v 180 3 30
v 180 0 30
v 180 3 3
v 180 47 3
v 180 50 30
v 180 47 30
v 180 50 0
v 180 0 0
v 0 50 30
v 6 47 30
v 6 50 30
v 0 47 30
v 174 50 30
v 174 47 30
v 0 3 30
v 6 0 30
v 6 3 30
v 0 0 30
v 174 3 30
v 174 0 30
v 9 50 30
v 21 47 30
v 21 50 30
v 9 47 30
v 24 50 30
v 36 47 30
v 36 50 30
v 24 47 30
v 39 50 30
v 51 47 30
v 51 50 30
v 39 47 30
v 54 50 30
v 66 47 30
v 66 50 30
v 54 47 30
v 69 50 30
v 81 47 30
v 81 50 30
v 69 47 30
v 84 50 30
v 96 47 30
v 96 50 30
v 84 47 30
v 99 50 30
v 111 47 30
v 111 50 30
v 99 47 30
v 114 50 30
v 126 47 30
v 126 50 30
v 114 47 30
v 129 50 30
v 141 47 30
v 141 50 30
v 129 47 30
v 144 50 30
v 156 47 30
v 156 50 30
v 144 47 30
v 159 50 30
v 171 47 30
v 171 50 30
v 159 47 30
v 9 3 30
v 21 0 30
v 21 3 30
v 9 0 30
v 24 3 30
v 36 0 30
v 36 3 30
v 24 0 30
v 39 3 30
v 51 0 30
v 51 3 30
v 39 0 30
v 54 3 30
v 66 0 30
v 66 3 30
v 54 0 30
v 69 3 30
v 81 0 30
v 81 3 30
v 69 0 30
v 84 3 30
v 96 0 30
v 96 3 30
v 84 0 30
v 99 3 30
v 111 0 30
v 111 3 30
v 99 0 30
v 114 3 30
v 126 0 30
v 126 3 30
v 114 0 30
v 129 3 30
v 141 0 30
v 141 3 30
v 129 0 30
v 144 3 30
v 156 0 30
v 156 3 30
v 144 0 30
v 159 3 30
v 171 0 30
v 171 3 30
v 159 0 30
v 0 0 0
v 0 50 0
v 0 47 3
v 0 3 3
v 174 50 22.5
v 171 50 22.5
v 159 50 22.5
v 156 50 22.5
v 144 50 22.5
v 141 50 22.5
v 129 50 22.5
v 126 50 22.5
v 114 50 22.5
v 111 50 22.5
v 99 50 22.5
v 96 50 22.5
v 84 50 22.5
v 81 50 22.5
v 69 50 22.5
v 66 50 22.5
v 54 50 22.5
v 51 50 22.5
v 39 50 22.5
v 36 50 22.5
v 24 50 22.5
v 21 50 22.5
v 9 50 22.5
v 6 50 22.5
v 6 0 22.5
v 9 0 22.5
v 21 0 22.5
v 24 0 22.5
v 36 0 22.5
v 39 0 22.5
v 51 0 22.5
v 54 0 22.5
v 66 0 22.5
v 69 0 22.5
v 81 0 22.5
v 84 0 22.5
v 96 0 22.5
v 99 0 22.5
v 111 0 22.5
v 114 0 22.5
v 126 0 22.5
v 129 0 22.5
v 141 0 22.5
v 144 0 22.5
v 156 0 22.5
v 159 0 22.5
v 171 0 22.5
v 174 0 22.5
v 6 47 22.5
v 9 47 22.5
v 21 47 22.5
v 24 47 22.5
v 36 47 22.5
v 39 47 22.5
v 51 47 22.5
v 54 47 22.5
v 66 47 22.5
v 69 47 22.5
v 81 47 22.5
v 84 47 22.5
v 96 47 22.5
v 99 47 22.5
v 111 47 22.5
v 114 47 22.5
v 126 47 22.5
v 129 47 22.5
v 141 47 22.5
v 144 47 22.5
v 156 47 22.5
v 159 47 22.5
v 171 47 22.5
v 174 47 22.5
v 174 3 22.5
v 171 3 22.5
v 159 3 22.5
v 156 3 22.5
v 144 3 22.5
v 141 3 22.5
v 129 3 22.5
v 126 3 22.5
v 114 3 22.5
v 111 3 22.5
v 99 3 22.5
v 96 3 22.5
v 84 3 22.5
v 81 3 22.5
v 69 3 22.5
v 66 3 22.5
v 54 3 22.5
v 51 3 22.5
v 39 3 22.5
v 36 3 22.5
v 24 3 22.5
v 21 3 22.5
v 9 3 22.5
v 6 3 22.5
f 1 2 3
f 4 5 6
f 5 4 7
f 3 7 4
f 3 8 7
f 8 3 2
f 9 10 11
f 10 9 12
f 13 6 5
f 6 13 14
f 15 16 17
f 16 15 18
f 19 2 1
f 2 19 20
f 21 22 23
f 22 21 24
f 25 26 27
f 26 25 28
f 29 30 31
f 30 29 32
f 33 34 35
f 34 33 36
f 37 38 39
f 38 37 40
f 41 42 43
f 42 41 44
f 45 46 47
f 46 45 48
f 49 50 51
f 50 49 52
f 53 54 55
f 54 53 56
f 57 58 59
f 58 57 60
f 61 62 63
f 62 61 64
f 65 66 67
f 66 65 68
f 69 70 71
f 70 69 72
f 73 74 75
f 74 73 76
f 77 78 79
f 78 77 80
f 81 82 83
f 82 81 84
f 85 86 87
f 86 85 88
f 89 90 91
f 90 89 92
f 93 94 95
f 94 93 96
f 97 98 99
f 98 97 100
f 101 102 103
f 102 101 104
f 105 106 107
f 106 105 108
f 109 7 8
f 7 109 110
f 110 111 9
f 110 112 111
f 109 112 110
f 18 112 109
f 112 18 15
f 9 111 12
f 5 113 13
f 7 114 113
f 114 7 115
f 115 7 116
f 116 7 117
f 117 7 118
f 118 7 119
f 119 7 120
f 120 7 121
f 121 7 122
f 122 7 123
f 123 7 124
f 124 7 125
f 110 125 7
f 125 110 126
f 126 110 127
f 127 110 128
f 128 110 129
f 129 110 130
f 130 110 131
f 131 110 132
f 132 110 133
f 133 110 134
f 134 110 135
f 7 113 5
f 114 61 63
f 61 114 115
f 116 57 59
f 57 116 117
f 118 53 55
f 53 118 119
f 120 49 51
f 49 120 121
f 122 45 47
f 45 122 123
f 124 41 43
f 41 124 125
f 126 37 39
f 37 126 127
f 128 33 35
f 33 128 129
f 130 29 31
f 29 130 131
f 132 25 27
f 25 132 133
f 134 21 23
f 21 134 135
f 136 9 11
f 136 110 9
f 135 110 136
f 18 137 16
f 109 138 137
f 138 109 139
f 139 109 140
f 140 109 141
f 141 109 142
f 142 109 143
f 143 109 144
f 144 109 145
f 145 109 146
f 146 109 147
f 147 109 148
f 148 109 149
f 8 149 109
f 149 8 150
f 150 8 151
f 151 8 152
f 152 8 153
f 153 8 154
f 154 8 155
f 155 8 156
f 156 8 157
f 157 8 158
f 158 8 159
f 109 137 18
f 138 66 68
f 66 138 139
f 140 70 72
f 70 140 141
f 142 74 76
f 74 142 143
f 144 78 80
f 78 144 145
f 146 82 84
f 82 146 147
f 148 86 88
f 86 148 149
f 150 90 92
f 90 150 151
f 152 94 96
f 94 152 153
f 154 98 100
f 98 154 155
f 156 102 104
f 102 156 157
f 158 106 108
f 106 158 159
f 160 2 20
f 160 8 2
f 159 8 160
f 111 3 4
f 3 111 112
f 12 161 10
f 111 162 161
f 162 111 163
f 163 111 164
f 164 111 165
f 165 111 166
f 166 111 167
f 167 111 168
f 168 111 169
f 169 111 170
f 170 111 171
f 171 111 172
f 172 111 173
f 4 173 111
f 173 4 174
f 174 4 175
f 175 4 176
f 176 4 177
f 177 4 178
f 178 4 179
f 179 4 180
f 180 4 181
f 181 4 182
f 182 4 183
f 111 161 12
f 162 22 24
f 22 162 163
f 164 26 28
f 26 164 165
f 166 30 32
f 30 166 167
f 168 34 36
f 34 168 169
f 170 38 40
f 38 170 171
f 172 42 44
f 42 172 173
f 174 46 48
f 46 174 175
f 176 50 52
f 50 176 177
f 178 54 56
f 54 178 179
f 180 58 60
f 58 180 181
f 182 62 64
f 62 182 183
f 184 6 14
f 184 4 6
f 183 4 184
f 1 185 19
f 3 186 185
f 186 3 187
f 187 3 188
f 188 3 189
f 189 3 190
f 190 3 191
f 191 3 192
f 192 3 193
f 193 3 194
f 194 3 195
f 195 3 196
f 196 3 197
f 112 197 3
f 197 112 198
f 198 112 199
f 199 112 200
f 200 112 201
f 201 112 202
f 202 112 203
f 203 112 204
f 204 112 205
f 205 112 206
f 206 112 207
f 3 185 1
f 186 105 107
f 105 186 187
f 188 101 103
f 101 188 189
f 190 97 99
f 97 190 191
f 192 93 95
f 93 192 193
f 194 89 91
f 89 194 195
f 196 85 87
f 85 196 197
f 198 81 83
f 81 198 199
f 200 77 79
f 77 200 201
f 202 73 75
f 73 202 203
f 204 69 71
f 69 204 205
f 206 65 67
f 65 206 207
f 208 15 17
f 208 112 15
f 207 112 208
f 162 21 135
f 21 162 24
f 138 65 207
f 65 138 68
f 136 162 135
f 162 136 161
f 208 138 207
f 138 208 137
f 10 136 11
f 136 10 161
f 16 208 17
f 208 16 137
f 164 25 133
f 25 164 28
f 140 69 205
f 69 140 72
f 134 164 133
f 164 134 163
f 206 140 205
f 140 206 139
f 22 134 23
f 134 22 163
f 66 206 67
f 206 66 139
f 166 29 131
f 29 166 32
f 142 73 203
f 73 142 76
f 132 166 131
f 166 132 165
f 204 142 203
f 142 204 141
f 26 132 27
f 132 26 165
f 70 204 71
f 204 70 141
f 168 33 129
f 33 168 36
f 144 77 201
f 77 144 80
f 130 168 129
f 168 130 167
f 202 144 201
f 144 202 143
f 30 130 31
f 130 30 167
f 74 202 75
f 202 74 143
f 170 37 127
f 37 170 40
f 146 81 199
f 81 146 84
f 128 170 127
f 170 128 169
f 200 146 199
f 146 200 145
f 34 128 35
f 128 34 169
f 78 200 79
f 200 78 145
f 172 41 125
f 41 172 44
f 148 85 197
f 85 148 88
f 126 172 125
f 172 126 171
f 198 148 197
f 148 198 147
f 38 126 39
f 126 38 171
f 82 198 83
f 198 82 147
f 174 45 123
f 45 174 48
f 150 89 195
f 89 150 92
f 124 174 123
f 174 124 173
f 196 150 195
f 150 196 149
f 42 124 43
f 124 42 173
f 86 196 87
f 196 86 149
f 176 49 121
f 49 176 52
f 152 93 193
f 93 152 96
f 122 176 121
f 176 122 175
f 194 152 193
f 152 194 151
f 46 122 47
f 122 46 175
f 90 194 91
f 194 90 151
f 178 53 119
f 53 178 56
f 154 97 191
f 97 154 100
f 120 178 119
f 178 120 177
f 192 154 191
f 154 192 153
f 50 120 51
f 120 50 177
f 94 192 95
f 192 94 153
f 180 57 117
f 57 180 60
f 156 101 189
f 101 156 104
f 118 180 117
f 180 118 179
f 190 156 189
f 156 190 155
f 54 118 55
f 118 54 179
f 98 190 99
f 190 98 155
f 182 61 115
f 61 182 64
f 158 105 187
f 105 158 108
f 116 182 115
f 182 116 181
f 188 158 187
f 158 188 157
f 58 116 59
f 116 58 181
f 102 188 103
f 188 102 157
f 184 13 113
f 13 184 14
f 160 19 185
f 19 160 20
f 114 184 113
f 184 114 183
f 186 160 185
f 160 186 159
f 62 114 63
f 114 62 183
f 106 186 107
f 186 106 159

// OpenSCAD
$fn = 32;

// ----------------------------------------------------------------------
// Cable duct: 180 x 50 x 30 mm, 12 fingers
// ----------------------------------------------------------------------

// --- parameters (mm) ---
duct_len = 180;           // duct length, X
duct_w = 50;              // duct width, Y
duct_h = 30;              // duct height, Z
wall_t = 3;               // side wall thickness
floor_t = 3;              // floor thickness
slot_w = 3;               // finger slot width
slot_h = 19.5;            // finger slot height
fingers = 12;             // number of finger slots per side
pitch = 15;               // finger pitch

module shell() {
  difference() {
    cube([duct_len, duct_w, duct_h]);
    /* open top channel */
    translate([-wall_t - 1, wall_t, floor_t])
      cube([duct_len + 2 * wall_t + 2, duct_w - 2 * wall_t, duct_h + 1]);
  }
}

difference() {
  union() {
    shell();
  }
  /* finger slots cut through both side walls */
  for (i = [0 : fingers - 1]) translate([pitch / 2 + i * pitch - slot_w / 2, -1, floor_t + slot_h]) cube([slot_w, duct_w + 2, duct_h]);
}
